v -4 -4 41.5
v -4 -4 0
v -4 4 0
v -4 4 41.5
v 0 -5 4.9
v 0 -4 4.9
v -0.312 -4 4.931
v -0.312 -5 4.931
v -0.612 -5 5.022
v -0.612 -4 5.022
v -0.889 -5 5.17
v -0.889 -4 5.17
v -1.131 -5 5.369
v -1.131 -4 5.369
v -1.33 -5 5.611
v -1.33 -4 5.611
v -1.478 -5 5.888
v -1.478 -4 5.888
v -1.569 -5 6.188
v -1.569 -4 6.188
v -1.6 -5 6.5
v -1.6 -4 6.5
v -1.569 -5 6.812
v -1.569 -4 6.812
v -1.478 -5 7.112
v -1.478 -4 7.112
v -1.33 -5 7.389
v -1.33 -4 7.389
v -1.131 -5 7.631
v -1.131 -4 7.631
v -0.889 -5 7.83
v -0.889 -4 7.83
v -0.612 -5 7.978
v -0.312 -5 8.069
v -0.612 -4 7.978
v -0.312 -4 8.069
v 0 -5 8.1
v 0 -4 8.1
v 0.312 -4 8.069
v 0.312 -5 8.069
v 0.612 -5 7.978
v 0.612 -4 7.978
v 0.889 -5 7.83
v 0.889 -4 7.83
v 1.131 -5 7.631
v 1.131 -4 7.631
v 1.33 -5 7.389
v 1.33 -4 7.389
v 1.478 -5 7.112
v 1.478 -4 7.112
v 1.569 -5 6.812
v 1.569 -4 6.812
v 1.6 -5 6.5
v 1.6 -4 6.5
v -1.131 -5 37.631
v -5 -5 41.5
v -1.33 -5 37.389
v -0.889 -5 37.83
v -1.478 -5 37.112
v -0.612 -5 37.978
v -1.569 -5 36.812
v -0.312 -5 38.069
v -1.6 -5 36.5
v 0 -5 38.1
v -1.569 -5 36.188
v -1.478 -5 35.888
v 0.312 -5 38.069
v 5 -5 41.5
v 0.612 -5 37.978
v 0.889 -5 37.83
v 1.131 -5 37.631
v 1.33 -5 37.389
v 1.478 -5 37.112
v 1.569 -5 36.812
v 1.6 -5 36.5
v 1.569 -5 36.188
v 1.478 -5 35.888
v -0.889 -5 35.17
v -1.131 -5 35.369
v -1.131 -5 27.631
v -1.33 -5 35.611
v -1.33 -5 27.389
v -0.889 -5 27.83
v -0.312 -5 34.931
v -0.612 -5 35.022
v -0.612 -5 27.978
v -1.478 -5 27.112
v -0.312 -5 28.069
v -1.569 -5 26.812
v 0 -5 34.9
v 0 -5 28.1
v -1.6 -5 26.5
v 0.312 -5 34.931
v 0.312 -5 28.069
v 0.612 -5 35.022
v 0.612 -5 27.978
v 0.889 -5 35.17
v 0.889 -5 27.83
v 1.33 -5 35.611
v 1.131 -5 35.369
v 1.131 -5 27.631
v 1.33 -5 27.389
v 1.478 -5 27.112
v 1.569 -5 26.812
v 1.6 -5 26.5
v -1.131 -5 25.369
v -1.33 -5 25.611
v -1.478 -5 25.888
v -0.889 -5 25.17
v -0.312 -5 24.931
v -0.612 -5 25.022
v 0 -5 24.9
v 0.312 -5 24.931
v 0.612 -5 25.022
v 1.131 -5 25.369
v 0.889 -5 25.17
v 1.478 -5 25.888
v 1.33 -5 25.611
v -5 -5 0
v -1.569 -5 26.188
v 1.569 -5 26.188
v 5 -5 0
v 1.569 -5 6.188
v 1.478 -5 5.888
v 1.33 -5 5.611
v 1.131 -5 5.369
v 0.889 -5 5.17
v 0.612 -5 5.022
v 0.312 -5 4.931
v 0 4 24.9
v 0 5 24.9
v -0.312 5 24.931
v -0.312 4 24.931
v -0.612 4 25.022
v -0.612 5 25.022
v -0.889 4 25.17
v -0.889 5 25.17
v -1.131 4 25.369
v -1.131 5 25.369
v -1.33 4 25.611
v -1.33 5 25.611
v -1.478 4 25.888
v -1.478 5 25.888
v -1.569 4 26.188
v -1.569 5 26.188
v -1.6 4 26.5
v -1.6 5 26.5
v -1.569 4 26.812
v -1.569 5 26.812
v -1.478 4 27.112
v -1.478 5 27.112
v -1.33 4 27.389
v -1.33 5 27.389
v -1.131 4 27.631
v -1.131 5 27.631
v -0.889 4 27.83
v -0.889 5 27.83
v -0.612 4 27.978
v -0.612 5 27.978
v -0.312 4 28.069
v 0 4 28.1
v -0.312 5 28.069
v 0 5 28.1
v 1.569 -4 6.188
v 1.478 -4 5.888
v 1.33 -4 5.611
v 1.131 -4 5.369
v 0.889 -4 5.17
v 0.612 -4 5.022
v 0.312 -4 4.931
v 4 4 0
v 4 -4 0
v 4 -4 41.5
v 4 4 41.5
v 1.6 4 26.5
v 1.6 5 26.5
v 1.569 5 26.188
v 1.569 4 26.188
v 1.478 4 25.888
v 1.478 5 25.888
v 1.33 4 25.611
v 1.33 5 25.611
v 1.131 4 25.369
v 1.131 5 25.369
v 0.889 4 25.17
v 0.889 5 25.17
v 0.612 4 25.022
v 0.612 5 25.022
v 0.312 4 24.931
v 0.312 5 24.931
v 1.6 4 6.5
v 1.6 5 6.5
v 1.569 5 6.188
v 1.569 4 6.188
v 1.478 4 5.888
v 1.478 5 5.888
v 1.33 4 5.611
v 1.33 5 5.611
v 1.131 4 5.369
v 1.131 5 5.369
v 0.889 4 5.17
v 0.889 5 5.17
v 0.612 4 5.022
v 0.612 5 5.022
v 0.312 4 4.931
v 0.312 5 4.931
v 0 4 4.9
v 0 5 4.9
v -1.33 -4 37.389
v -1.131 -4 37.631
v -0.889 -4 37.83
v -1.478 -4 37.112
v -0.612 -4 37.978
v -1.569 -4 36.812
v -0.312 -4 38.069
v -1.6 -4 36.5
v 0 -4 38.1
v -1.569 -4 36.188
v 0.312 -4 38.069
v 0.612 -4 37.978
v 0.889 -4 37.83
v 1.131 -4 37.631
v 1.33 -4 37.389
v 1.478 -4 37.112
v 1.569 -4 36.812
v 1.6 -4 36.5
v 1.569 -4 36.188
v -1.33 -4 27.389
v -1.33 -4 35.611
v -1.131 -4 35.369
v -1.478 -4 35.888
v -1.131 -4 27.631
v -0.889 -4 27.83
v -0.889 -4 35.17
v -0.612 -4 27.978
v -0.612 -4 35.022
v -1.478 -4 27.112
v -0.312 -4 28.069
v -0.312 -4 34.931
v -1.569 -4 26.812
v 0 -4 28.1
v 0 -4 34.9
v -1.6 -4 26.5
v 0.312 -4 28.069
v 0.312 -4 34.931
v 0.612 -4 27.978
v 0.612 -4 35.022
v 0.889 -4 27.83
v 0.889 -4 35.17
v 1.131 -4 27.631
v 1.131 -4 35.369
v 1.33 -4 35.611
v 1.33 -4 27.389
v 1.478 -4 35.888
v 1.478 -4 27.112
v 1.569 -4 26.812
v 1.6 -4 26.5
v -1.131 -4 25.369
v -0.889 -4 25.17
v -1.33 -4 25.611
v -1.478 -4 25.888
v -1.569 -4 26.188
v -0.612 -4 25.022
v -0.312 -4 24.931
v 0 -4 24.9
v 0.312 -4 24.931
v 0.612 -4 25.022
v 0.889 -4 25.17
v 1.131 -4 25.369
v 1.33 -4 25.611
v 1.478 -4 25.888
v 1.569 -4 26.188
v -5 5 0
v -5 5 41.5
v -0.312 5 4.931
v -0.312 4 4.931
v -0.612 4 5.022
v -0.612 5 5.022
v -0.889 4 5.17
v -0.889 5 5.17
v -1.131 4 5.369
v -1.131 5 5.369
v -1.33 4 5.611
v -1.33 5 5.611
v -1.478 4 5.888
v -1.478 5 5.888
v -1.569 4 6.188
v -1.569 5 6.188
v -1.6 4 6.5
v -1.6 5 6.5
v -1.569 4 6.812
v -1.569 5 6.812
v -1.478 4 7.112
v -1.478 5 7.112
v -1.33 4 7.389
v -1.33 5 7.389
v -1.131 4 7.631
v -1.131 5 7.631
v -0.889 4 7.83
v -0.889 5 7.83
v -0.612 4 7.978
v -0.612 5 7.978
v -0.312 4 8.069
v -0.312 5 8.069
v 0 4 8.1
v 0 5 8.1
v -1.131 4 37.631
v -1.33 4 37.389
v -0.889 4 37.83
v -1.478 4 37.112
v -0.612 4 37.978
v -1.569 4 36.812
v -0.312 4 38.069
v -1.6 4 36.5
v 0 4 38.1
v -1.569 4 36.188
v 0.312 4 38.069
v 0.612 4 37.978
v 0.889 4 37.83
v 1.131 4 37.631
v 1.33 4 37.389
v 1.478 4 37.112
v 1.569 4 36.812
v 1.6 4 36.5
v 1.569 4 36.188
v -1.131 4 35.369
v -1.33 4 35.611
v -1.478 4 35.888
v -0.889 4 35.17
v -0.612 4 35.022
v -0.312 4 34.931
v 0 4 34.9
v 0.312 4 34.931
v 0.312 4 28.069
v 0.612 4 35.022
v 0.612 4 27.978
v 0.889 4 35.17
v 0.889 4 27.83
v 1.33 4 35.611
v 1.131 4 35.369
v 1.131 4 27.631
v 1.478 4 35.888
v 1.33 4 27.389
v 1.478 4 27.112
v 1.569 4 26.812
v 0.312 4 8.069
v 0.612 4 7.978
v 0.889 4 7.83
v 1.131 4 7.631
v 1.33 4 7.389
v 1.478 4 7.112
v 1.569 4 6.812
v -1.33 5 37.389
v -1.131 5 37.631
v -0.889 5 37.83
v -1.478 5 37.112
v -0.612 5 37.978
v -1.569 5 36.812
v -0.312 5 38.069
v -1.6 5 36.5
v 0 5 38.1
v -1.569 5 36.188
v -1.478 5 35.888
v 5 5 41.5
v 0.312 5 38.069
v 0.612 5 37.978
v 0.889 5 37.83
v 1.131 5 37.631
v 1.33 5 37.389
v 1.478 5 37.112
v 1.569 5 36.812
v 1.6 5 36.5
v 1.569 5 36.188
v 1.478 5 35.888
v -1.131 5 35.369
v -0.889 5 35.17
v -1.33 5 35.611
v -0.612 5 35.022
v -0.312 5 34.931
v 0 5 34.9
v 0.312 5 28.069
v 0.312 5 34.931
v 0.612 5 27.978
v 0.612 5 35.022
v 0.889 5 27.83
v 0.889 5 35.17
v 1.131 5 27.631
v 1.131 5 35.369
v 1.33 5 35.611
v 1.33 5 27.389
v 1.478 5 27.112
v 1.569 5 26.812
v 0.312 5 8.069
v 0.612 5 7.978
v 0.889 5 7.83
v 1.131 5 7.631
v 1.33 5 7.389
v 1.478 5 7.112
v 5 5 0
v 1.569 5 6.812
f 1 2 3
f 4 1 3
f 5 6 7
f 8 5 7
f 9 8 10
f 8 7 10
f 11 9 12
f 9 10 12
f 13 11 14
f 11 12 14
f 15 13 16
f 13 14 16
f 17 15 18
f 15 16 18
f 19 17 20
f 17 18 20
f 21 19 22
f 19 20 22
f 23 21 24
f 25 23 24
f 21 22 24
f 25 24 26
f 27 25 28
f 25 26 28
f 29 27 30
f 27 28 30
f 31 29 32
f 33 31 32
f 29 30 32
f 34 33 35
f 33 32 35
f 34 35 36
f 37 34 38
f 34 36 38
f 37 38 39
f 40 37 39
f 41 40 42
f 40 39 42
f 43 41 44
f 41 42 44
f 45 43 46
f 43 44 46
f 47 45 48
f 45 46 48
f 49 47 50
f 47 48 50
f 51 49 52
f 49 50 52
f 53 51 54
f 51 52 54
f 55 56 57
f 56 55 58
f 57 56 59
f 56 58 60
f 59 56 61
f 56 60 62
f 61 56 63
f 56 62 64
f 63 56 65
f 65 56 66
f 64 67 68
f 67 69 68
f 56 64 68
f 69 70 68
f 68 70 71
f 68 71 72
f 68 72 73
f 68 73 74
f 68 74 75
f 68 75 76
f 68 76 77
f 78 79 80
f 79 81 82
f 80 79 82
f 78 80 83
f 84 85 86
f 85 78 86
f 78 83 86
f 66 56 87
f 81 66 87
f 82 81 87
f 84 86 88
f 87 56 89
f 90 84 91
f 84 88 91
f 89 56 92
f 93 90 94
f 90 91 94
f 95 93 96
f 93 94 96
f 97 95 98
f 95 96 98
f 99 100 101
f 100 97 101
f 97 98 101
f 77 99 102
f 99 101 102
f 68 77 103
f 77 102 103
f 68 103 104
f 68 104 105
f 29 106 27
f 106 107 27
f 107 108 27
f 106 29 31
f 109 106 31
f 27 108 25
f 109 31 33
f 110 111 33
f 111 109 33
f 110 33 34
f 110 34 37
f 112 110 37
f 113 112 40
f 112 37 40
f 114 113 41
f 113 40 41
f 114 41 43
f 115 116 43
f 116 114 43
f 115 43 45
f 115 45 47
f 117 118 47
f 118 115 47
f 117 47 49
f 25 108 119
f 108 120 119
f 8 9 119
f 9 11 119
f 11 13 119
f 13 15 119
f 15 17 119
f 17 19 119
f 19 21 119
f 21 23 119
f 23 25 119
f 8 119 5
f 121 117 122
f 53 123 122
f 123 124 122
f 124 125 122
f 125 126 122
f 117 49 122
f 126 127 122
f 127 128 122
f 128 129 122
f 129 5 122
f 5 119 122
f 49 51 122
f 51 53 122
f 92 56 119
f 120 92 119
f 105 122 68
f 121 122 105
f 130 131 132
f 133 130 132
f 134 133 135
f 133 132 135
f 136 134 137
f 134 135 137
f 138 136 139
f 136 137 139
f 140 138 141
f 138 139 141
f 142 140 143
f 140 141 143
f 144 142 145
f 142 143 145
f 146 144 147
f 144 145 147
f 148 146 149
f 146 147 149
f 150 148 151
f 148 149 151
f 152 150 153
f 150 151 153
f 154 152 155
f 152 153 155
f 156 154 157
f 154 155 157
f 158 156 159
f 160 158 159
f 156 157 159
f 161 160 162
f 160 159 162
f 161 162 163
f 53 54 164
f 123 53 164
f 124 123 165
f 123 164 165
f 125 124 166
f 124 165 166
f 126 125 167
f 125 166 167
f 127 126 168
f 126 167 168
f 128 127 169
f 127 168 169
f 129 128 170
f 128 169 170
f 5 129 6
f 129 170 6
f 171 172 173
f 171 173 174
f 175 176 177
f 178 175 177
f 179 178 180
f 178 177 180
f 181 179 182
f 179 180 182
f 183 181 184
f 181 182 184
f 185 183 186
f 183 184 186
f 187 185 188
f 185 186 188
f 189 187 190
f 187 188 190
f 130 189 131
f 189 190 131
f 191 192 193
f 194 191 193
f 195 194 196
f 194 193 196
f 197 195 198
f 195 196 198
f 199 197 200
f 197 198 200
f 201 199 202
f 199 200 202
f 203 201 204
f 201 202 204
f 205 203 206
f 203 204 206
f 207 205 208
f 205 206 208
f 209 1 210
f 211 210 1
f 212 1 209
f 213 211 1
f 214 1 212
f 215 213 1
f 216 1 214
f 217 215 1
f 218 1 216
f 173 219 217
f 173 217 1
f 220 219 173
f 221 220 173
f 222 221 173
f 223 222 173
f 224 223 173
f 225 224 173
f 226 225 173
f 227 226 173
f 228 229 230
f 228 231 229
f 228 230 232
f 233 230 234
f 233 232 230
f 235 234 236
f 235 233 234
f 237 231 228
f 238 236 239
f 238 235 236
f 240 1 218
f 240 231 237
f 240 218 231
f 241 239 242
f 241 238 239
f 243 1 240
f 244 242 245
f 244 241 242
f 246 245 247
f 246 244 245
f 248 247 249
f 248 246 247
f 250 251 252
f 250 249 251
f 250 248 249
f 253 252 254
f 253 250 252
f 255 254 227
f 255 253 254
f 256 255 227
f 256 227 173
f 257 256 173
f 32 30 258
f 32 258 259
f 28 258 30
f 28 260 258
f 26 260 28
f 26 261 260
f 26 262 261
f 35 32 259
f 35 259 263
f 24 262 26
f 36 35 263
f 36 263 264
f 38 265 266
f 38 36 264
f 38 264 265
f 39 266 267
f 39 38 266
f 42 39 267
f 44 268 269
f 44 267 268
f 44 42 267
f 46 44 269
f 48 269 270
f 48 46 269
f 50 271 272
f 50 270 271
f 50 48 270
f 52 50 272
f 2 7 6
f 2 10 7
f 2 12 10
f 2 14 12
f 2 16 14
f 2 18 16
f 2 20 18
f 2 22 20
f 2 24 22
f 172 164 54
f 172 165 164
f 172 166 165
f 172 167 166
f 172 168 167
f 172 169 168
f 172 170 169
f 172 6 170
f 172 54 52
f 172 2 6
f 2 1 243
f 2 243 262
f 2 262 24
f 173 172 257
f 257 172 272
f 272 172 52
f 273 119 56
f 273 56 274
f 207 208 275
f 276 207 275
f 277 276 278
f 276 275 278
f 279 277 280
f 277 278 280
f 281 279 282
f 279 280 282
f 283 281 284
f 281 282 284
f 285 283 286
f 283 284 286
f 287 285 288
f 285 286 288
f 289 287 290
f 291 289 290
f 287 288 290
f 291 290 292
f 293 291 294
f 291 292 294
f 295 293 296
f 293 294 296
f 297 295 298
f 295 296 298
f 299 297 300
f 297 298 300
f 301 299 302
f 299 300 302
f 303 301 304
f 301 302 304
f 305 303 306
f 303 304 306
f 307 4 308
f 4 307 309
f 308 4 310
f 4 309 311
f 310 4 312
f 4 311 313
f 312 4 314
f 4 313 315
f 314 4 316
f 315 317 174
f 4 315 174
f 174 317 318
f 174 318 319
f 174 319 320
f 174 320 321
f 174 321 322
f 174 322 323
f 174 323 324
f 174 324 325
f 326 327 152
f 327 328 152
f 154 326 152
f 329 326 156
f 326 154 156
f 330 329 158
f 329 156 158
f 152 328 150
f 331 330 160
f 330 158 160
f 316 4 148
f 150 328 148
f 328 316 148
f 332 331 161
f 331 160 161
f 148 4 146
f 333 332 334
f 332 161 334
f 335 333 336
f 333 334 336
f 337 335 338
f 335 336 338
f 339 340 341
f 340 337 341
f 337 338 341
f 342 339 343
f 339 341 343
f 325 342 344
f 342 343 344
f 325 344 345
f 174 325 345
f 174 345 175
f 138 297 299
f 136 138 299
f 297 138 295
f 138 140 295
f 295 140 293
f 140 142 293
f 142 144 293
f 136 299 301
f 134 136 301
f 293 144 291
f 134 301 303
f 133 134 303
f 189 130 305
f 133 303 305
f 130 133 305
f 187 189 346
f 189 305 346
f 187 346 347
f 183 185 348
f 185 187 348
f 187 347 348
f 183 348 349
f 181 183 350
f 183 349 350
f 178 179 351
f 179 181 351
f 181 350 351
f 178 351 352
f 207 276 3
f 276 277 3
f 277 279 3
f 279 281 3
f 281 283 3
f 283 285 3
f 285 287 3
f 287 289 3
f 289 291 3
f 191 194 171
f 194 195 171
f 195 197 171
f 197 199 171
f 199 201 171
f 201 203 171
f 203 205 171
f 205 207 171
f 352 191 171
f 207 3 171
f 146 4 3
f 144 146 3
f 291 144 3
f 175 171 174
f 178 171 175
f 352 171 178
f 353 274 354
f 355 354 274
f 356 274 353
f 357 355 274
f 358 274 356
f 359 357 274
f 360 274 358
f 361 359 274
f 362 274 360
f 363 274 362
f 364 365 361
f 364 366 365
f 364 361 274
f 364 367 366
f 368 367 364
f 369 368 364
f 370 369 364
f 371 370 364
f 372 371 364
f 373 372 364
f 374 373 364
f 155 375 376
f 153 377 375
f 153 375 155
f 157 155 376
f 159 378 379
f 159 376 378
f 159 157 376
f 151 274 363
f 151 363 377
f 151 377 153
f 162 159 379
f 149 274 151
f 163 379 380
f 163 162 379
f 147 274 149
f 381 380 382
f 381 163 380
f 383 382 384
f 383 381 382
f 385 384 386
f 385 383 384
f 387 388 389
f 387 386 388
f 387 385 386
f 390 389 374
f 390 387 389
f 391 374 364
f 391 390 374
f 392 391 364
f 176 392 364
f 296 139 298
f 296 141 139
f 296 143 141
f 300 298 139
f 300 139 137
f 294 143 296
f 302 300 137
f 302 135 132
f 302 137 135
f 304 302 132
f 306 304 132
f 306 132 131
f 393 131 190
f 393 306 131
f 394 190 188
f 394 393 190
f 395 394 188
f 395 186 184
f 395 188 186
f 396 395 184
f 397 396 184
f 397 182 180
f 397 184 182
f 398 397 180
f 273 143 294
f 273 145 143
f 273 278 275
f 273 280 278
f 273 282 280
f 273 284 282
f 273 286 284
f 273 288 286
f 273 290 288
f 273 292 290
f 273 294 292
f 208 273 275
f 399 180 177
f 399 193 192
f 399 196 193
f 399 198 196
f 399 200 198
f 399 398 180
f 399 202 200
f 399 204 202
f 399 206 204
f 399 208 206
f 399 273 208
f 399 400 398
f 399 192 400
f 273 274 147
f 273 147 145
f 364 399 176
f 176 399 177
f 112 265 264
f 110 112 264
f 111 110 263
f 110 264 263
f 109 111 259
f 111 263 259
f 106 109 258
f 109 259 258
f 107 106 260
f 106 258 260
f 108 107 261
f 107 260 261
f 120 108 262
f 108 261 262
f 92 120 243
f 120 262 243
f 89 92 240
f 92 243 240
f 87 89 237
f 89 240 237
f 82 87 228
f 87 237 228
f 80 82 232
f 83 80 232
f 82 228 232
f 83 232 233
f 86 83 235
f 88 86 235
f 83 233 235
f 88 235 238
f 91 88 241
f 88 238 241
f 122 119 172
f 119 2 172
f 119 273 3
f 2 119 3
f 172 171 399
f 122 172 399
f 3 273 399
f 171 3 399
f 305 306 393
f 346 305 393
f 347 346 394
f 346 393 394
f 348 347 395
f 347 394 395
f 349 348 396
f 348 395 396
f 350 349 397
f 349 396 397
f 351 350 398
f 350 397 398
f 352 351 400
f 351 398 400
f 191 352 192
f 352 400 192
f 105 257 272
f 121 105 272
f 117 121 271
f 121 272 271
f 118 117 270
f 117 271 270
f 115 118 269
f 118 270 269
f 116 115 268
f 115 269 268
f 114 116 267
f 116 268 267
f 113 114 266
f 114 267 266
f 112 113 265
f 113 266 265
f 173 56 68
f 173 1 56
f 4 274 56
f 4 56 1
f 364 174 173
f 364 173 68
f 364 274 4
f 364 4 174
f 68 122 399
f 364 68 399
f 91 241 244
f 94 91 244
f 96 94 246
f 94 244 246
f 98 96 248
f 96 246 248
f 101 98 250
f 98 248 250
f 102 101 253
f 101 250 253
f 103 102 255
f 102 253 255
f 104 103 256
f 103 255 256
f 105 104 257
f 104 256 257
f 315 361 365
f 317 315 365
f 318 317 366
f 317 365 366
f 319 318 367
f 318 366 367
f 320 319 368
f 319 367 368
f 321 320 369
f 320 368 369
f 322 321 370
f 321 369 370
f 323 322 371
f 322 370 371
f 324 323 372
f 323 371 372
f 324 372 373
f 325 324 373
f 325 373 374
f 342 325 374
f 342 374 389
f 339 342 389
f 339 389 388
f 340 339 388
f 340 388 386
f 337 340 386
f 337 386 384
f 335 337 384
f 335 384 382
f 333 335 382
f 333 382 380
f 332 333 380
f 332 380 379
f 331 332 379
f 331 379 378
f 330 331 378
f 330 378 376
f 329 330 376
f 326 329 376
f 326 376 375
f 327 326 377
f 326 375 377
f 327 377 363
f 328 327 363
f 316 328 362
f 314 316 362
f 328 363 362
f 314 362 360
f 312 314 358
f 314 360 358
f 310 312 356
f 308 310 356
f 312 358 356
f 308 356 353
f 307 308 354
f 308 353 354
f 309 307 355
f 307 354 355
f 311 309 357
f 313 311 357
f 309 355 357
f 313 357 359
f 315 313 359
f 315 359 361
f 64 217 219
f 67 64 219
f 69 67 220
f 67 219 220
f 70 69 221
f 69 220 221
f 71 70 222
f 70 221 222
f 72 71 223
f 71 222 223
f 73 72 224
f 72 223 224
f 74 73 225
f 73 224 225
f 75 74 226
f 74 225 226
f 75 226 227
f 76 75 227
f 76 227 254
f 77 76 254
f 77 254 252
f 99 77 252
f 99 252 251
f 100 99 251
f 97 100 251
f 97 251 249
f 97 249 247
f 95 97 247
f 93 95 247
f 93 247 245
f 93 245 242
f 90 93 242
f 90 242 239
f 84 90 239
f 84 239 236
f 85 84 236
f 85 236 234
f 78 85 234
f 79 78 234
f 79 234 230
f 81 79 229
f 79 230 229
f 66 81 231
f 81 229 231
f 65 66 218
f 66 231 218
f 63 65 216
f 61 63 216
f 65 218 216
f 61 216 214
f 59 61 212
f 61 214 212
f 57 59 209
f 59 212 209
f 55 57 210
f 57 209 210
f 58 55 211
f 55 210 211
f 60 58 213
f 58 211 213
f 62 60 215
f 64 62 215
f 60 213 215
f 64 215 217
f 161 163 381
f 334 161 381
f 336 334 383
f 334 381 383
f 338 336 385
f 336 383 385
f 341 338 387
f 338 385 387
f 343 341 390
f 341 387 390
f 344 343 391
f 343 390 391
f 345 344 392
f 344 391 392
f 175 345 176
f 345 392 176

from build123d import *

# Parameters (mm, degrees)
SKETCH_1_W          = 10
SKETCH_1_H          = 10
SKETCH_1_W_2        = 8
SKETCH_1_H_2        = 8
EXTRUDE_1_DEPTH     = 41.5
SKETCH_2_R          = 1.6
CUT_EXTRUDE_1_DEPTH = 10


with BuildPart() as part:
    # ｽｹｯﾁ1 → 押し出し-薄板1 (new body)
    with BuildSketch(Plane.XY):
        Rectangle(SKETCH_1_W, SKETCH_1_H)
        Rectangle(SKETCH_1_W_2, SKETCH_1_H_2, mode=Mode.SUBTRACT)
    extrude(amount=EXTRUDE_1_DEPTH)

    # ｽｹｯﾁ2 → ｶｯﾄ - 押し出し1 (cut)
    with BuildSketch(Plane(origin=(0, 5, 0), x_dir=(1, 0, 0), z_dir=(0, 1, 0))):
        with BuildLine():
            ThreePointArc((1.6, -6.5), (1.13137085, -5.36862915), (0, -4.9))
            Line((0, -4.9), (0, -8.1))
            ThreePointArc((0, -8.1), (1.13137085, -7.63137085), (1.6, -6.5))
        make_face()
        with BuildLine():
            Line((0, -8.1), (0, -4.9))
            ThreePointArc((0, -4.9), (-1.6, -6.5), (0, -8.1))
        make_face()
        with BuildLine():
            ThreePointArc((1.6, -26.5), (1.13137085, -25.36862915), (0, -24.9))
            Line((0, -24.9), (0, -28.1))
            ThreePointArc((0, -28.1), (1.13137085, -27.63137085), (1.6, -26.5))
        make_face()
        with BuildLine():
            Line((0, -28.1), (0, -24.9))
            ThreePointArc((0, -24.9), (-1.6, -26.5), (0, -28.1))
        make_face()
        with Locations(Location((0, -36.5, 0), (0, 0, 270))):
            Circle(SKETCH_2_R)
    extrude(amount=-CUT_EXTRUDE_1_DEPTH, mode=Mode.SUBTRACT)


solid = part.part
